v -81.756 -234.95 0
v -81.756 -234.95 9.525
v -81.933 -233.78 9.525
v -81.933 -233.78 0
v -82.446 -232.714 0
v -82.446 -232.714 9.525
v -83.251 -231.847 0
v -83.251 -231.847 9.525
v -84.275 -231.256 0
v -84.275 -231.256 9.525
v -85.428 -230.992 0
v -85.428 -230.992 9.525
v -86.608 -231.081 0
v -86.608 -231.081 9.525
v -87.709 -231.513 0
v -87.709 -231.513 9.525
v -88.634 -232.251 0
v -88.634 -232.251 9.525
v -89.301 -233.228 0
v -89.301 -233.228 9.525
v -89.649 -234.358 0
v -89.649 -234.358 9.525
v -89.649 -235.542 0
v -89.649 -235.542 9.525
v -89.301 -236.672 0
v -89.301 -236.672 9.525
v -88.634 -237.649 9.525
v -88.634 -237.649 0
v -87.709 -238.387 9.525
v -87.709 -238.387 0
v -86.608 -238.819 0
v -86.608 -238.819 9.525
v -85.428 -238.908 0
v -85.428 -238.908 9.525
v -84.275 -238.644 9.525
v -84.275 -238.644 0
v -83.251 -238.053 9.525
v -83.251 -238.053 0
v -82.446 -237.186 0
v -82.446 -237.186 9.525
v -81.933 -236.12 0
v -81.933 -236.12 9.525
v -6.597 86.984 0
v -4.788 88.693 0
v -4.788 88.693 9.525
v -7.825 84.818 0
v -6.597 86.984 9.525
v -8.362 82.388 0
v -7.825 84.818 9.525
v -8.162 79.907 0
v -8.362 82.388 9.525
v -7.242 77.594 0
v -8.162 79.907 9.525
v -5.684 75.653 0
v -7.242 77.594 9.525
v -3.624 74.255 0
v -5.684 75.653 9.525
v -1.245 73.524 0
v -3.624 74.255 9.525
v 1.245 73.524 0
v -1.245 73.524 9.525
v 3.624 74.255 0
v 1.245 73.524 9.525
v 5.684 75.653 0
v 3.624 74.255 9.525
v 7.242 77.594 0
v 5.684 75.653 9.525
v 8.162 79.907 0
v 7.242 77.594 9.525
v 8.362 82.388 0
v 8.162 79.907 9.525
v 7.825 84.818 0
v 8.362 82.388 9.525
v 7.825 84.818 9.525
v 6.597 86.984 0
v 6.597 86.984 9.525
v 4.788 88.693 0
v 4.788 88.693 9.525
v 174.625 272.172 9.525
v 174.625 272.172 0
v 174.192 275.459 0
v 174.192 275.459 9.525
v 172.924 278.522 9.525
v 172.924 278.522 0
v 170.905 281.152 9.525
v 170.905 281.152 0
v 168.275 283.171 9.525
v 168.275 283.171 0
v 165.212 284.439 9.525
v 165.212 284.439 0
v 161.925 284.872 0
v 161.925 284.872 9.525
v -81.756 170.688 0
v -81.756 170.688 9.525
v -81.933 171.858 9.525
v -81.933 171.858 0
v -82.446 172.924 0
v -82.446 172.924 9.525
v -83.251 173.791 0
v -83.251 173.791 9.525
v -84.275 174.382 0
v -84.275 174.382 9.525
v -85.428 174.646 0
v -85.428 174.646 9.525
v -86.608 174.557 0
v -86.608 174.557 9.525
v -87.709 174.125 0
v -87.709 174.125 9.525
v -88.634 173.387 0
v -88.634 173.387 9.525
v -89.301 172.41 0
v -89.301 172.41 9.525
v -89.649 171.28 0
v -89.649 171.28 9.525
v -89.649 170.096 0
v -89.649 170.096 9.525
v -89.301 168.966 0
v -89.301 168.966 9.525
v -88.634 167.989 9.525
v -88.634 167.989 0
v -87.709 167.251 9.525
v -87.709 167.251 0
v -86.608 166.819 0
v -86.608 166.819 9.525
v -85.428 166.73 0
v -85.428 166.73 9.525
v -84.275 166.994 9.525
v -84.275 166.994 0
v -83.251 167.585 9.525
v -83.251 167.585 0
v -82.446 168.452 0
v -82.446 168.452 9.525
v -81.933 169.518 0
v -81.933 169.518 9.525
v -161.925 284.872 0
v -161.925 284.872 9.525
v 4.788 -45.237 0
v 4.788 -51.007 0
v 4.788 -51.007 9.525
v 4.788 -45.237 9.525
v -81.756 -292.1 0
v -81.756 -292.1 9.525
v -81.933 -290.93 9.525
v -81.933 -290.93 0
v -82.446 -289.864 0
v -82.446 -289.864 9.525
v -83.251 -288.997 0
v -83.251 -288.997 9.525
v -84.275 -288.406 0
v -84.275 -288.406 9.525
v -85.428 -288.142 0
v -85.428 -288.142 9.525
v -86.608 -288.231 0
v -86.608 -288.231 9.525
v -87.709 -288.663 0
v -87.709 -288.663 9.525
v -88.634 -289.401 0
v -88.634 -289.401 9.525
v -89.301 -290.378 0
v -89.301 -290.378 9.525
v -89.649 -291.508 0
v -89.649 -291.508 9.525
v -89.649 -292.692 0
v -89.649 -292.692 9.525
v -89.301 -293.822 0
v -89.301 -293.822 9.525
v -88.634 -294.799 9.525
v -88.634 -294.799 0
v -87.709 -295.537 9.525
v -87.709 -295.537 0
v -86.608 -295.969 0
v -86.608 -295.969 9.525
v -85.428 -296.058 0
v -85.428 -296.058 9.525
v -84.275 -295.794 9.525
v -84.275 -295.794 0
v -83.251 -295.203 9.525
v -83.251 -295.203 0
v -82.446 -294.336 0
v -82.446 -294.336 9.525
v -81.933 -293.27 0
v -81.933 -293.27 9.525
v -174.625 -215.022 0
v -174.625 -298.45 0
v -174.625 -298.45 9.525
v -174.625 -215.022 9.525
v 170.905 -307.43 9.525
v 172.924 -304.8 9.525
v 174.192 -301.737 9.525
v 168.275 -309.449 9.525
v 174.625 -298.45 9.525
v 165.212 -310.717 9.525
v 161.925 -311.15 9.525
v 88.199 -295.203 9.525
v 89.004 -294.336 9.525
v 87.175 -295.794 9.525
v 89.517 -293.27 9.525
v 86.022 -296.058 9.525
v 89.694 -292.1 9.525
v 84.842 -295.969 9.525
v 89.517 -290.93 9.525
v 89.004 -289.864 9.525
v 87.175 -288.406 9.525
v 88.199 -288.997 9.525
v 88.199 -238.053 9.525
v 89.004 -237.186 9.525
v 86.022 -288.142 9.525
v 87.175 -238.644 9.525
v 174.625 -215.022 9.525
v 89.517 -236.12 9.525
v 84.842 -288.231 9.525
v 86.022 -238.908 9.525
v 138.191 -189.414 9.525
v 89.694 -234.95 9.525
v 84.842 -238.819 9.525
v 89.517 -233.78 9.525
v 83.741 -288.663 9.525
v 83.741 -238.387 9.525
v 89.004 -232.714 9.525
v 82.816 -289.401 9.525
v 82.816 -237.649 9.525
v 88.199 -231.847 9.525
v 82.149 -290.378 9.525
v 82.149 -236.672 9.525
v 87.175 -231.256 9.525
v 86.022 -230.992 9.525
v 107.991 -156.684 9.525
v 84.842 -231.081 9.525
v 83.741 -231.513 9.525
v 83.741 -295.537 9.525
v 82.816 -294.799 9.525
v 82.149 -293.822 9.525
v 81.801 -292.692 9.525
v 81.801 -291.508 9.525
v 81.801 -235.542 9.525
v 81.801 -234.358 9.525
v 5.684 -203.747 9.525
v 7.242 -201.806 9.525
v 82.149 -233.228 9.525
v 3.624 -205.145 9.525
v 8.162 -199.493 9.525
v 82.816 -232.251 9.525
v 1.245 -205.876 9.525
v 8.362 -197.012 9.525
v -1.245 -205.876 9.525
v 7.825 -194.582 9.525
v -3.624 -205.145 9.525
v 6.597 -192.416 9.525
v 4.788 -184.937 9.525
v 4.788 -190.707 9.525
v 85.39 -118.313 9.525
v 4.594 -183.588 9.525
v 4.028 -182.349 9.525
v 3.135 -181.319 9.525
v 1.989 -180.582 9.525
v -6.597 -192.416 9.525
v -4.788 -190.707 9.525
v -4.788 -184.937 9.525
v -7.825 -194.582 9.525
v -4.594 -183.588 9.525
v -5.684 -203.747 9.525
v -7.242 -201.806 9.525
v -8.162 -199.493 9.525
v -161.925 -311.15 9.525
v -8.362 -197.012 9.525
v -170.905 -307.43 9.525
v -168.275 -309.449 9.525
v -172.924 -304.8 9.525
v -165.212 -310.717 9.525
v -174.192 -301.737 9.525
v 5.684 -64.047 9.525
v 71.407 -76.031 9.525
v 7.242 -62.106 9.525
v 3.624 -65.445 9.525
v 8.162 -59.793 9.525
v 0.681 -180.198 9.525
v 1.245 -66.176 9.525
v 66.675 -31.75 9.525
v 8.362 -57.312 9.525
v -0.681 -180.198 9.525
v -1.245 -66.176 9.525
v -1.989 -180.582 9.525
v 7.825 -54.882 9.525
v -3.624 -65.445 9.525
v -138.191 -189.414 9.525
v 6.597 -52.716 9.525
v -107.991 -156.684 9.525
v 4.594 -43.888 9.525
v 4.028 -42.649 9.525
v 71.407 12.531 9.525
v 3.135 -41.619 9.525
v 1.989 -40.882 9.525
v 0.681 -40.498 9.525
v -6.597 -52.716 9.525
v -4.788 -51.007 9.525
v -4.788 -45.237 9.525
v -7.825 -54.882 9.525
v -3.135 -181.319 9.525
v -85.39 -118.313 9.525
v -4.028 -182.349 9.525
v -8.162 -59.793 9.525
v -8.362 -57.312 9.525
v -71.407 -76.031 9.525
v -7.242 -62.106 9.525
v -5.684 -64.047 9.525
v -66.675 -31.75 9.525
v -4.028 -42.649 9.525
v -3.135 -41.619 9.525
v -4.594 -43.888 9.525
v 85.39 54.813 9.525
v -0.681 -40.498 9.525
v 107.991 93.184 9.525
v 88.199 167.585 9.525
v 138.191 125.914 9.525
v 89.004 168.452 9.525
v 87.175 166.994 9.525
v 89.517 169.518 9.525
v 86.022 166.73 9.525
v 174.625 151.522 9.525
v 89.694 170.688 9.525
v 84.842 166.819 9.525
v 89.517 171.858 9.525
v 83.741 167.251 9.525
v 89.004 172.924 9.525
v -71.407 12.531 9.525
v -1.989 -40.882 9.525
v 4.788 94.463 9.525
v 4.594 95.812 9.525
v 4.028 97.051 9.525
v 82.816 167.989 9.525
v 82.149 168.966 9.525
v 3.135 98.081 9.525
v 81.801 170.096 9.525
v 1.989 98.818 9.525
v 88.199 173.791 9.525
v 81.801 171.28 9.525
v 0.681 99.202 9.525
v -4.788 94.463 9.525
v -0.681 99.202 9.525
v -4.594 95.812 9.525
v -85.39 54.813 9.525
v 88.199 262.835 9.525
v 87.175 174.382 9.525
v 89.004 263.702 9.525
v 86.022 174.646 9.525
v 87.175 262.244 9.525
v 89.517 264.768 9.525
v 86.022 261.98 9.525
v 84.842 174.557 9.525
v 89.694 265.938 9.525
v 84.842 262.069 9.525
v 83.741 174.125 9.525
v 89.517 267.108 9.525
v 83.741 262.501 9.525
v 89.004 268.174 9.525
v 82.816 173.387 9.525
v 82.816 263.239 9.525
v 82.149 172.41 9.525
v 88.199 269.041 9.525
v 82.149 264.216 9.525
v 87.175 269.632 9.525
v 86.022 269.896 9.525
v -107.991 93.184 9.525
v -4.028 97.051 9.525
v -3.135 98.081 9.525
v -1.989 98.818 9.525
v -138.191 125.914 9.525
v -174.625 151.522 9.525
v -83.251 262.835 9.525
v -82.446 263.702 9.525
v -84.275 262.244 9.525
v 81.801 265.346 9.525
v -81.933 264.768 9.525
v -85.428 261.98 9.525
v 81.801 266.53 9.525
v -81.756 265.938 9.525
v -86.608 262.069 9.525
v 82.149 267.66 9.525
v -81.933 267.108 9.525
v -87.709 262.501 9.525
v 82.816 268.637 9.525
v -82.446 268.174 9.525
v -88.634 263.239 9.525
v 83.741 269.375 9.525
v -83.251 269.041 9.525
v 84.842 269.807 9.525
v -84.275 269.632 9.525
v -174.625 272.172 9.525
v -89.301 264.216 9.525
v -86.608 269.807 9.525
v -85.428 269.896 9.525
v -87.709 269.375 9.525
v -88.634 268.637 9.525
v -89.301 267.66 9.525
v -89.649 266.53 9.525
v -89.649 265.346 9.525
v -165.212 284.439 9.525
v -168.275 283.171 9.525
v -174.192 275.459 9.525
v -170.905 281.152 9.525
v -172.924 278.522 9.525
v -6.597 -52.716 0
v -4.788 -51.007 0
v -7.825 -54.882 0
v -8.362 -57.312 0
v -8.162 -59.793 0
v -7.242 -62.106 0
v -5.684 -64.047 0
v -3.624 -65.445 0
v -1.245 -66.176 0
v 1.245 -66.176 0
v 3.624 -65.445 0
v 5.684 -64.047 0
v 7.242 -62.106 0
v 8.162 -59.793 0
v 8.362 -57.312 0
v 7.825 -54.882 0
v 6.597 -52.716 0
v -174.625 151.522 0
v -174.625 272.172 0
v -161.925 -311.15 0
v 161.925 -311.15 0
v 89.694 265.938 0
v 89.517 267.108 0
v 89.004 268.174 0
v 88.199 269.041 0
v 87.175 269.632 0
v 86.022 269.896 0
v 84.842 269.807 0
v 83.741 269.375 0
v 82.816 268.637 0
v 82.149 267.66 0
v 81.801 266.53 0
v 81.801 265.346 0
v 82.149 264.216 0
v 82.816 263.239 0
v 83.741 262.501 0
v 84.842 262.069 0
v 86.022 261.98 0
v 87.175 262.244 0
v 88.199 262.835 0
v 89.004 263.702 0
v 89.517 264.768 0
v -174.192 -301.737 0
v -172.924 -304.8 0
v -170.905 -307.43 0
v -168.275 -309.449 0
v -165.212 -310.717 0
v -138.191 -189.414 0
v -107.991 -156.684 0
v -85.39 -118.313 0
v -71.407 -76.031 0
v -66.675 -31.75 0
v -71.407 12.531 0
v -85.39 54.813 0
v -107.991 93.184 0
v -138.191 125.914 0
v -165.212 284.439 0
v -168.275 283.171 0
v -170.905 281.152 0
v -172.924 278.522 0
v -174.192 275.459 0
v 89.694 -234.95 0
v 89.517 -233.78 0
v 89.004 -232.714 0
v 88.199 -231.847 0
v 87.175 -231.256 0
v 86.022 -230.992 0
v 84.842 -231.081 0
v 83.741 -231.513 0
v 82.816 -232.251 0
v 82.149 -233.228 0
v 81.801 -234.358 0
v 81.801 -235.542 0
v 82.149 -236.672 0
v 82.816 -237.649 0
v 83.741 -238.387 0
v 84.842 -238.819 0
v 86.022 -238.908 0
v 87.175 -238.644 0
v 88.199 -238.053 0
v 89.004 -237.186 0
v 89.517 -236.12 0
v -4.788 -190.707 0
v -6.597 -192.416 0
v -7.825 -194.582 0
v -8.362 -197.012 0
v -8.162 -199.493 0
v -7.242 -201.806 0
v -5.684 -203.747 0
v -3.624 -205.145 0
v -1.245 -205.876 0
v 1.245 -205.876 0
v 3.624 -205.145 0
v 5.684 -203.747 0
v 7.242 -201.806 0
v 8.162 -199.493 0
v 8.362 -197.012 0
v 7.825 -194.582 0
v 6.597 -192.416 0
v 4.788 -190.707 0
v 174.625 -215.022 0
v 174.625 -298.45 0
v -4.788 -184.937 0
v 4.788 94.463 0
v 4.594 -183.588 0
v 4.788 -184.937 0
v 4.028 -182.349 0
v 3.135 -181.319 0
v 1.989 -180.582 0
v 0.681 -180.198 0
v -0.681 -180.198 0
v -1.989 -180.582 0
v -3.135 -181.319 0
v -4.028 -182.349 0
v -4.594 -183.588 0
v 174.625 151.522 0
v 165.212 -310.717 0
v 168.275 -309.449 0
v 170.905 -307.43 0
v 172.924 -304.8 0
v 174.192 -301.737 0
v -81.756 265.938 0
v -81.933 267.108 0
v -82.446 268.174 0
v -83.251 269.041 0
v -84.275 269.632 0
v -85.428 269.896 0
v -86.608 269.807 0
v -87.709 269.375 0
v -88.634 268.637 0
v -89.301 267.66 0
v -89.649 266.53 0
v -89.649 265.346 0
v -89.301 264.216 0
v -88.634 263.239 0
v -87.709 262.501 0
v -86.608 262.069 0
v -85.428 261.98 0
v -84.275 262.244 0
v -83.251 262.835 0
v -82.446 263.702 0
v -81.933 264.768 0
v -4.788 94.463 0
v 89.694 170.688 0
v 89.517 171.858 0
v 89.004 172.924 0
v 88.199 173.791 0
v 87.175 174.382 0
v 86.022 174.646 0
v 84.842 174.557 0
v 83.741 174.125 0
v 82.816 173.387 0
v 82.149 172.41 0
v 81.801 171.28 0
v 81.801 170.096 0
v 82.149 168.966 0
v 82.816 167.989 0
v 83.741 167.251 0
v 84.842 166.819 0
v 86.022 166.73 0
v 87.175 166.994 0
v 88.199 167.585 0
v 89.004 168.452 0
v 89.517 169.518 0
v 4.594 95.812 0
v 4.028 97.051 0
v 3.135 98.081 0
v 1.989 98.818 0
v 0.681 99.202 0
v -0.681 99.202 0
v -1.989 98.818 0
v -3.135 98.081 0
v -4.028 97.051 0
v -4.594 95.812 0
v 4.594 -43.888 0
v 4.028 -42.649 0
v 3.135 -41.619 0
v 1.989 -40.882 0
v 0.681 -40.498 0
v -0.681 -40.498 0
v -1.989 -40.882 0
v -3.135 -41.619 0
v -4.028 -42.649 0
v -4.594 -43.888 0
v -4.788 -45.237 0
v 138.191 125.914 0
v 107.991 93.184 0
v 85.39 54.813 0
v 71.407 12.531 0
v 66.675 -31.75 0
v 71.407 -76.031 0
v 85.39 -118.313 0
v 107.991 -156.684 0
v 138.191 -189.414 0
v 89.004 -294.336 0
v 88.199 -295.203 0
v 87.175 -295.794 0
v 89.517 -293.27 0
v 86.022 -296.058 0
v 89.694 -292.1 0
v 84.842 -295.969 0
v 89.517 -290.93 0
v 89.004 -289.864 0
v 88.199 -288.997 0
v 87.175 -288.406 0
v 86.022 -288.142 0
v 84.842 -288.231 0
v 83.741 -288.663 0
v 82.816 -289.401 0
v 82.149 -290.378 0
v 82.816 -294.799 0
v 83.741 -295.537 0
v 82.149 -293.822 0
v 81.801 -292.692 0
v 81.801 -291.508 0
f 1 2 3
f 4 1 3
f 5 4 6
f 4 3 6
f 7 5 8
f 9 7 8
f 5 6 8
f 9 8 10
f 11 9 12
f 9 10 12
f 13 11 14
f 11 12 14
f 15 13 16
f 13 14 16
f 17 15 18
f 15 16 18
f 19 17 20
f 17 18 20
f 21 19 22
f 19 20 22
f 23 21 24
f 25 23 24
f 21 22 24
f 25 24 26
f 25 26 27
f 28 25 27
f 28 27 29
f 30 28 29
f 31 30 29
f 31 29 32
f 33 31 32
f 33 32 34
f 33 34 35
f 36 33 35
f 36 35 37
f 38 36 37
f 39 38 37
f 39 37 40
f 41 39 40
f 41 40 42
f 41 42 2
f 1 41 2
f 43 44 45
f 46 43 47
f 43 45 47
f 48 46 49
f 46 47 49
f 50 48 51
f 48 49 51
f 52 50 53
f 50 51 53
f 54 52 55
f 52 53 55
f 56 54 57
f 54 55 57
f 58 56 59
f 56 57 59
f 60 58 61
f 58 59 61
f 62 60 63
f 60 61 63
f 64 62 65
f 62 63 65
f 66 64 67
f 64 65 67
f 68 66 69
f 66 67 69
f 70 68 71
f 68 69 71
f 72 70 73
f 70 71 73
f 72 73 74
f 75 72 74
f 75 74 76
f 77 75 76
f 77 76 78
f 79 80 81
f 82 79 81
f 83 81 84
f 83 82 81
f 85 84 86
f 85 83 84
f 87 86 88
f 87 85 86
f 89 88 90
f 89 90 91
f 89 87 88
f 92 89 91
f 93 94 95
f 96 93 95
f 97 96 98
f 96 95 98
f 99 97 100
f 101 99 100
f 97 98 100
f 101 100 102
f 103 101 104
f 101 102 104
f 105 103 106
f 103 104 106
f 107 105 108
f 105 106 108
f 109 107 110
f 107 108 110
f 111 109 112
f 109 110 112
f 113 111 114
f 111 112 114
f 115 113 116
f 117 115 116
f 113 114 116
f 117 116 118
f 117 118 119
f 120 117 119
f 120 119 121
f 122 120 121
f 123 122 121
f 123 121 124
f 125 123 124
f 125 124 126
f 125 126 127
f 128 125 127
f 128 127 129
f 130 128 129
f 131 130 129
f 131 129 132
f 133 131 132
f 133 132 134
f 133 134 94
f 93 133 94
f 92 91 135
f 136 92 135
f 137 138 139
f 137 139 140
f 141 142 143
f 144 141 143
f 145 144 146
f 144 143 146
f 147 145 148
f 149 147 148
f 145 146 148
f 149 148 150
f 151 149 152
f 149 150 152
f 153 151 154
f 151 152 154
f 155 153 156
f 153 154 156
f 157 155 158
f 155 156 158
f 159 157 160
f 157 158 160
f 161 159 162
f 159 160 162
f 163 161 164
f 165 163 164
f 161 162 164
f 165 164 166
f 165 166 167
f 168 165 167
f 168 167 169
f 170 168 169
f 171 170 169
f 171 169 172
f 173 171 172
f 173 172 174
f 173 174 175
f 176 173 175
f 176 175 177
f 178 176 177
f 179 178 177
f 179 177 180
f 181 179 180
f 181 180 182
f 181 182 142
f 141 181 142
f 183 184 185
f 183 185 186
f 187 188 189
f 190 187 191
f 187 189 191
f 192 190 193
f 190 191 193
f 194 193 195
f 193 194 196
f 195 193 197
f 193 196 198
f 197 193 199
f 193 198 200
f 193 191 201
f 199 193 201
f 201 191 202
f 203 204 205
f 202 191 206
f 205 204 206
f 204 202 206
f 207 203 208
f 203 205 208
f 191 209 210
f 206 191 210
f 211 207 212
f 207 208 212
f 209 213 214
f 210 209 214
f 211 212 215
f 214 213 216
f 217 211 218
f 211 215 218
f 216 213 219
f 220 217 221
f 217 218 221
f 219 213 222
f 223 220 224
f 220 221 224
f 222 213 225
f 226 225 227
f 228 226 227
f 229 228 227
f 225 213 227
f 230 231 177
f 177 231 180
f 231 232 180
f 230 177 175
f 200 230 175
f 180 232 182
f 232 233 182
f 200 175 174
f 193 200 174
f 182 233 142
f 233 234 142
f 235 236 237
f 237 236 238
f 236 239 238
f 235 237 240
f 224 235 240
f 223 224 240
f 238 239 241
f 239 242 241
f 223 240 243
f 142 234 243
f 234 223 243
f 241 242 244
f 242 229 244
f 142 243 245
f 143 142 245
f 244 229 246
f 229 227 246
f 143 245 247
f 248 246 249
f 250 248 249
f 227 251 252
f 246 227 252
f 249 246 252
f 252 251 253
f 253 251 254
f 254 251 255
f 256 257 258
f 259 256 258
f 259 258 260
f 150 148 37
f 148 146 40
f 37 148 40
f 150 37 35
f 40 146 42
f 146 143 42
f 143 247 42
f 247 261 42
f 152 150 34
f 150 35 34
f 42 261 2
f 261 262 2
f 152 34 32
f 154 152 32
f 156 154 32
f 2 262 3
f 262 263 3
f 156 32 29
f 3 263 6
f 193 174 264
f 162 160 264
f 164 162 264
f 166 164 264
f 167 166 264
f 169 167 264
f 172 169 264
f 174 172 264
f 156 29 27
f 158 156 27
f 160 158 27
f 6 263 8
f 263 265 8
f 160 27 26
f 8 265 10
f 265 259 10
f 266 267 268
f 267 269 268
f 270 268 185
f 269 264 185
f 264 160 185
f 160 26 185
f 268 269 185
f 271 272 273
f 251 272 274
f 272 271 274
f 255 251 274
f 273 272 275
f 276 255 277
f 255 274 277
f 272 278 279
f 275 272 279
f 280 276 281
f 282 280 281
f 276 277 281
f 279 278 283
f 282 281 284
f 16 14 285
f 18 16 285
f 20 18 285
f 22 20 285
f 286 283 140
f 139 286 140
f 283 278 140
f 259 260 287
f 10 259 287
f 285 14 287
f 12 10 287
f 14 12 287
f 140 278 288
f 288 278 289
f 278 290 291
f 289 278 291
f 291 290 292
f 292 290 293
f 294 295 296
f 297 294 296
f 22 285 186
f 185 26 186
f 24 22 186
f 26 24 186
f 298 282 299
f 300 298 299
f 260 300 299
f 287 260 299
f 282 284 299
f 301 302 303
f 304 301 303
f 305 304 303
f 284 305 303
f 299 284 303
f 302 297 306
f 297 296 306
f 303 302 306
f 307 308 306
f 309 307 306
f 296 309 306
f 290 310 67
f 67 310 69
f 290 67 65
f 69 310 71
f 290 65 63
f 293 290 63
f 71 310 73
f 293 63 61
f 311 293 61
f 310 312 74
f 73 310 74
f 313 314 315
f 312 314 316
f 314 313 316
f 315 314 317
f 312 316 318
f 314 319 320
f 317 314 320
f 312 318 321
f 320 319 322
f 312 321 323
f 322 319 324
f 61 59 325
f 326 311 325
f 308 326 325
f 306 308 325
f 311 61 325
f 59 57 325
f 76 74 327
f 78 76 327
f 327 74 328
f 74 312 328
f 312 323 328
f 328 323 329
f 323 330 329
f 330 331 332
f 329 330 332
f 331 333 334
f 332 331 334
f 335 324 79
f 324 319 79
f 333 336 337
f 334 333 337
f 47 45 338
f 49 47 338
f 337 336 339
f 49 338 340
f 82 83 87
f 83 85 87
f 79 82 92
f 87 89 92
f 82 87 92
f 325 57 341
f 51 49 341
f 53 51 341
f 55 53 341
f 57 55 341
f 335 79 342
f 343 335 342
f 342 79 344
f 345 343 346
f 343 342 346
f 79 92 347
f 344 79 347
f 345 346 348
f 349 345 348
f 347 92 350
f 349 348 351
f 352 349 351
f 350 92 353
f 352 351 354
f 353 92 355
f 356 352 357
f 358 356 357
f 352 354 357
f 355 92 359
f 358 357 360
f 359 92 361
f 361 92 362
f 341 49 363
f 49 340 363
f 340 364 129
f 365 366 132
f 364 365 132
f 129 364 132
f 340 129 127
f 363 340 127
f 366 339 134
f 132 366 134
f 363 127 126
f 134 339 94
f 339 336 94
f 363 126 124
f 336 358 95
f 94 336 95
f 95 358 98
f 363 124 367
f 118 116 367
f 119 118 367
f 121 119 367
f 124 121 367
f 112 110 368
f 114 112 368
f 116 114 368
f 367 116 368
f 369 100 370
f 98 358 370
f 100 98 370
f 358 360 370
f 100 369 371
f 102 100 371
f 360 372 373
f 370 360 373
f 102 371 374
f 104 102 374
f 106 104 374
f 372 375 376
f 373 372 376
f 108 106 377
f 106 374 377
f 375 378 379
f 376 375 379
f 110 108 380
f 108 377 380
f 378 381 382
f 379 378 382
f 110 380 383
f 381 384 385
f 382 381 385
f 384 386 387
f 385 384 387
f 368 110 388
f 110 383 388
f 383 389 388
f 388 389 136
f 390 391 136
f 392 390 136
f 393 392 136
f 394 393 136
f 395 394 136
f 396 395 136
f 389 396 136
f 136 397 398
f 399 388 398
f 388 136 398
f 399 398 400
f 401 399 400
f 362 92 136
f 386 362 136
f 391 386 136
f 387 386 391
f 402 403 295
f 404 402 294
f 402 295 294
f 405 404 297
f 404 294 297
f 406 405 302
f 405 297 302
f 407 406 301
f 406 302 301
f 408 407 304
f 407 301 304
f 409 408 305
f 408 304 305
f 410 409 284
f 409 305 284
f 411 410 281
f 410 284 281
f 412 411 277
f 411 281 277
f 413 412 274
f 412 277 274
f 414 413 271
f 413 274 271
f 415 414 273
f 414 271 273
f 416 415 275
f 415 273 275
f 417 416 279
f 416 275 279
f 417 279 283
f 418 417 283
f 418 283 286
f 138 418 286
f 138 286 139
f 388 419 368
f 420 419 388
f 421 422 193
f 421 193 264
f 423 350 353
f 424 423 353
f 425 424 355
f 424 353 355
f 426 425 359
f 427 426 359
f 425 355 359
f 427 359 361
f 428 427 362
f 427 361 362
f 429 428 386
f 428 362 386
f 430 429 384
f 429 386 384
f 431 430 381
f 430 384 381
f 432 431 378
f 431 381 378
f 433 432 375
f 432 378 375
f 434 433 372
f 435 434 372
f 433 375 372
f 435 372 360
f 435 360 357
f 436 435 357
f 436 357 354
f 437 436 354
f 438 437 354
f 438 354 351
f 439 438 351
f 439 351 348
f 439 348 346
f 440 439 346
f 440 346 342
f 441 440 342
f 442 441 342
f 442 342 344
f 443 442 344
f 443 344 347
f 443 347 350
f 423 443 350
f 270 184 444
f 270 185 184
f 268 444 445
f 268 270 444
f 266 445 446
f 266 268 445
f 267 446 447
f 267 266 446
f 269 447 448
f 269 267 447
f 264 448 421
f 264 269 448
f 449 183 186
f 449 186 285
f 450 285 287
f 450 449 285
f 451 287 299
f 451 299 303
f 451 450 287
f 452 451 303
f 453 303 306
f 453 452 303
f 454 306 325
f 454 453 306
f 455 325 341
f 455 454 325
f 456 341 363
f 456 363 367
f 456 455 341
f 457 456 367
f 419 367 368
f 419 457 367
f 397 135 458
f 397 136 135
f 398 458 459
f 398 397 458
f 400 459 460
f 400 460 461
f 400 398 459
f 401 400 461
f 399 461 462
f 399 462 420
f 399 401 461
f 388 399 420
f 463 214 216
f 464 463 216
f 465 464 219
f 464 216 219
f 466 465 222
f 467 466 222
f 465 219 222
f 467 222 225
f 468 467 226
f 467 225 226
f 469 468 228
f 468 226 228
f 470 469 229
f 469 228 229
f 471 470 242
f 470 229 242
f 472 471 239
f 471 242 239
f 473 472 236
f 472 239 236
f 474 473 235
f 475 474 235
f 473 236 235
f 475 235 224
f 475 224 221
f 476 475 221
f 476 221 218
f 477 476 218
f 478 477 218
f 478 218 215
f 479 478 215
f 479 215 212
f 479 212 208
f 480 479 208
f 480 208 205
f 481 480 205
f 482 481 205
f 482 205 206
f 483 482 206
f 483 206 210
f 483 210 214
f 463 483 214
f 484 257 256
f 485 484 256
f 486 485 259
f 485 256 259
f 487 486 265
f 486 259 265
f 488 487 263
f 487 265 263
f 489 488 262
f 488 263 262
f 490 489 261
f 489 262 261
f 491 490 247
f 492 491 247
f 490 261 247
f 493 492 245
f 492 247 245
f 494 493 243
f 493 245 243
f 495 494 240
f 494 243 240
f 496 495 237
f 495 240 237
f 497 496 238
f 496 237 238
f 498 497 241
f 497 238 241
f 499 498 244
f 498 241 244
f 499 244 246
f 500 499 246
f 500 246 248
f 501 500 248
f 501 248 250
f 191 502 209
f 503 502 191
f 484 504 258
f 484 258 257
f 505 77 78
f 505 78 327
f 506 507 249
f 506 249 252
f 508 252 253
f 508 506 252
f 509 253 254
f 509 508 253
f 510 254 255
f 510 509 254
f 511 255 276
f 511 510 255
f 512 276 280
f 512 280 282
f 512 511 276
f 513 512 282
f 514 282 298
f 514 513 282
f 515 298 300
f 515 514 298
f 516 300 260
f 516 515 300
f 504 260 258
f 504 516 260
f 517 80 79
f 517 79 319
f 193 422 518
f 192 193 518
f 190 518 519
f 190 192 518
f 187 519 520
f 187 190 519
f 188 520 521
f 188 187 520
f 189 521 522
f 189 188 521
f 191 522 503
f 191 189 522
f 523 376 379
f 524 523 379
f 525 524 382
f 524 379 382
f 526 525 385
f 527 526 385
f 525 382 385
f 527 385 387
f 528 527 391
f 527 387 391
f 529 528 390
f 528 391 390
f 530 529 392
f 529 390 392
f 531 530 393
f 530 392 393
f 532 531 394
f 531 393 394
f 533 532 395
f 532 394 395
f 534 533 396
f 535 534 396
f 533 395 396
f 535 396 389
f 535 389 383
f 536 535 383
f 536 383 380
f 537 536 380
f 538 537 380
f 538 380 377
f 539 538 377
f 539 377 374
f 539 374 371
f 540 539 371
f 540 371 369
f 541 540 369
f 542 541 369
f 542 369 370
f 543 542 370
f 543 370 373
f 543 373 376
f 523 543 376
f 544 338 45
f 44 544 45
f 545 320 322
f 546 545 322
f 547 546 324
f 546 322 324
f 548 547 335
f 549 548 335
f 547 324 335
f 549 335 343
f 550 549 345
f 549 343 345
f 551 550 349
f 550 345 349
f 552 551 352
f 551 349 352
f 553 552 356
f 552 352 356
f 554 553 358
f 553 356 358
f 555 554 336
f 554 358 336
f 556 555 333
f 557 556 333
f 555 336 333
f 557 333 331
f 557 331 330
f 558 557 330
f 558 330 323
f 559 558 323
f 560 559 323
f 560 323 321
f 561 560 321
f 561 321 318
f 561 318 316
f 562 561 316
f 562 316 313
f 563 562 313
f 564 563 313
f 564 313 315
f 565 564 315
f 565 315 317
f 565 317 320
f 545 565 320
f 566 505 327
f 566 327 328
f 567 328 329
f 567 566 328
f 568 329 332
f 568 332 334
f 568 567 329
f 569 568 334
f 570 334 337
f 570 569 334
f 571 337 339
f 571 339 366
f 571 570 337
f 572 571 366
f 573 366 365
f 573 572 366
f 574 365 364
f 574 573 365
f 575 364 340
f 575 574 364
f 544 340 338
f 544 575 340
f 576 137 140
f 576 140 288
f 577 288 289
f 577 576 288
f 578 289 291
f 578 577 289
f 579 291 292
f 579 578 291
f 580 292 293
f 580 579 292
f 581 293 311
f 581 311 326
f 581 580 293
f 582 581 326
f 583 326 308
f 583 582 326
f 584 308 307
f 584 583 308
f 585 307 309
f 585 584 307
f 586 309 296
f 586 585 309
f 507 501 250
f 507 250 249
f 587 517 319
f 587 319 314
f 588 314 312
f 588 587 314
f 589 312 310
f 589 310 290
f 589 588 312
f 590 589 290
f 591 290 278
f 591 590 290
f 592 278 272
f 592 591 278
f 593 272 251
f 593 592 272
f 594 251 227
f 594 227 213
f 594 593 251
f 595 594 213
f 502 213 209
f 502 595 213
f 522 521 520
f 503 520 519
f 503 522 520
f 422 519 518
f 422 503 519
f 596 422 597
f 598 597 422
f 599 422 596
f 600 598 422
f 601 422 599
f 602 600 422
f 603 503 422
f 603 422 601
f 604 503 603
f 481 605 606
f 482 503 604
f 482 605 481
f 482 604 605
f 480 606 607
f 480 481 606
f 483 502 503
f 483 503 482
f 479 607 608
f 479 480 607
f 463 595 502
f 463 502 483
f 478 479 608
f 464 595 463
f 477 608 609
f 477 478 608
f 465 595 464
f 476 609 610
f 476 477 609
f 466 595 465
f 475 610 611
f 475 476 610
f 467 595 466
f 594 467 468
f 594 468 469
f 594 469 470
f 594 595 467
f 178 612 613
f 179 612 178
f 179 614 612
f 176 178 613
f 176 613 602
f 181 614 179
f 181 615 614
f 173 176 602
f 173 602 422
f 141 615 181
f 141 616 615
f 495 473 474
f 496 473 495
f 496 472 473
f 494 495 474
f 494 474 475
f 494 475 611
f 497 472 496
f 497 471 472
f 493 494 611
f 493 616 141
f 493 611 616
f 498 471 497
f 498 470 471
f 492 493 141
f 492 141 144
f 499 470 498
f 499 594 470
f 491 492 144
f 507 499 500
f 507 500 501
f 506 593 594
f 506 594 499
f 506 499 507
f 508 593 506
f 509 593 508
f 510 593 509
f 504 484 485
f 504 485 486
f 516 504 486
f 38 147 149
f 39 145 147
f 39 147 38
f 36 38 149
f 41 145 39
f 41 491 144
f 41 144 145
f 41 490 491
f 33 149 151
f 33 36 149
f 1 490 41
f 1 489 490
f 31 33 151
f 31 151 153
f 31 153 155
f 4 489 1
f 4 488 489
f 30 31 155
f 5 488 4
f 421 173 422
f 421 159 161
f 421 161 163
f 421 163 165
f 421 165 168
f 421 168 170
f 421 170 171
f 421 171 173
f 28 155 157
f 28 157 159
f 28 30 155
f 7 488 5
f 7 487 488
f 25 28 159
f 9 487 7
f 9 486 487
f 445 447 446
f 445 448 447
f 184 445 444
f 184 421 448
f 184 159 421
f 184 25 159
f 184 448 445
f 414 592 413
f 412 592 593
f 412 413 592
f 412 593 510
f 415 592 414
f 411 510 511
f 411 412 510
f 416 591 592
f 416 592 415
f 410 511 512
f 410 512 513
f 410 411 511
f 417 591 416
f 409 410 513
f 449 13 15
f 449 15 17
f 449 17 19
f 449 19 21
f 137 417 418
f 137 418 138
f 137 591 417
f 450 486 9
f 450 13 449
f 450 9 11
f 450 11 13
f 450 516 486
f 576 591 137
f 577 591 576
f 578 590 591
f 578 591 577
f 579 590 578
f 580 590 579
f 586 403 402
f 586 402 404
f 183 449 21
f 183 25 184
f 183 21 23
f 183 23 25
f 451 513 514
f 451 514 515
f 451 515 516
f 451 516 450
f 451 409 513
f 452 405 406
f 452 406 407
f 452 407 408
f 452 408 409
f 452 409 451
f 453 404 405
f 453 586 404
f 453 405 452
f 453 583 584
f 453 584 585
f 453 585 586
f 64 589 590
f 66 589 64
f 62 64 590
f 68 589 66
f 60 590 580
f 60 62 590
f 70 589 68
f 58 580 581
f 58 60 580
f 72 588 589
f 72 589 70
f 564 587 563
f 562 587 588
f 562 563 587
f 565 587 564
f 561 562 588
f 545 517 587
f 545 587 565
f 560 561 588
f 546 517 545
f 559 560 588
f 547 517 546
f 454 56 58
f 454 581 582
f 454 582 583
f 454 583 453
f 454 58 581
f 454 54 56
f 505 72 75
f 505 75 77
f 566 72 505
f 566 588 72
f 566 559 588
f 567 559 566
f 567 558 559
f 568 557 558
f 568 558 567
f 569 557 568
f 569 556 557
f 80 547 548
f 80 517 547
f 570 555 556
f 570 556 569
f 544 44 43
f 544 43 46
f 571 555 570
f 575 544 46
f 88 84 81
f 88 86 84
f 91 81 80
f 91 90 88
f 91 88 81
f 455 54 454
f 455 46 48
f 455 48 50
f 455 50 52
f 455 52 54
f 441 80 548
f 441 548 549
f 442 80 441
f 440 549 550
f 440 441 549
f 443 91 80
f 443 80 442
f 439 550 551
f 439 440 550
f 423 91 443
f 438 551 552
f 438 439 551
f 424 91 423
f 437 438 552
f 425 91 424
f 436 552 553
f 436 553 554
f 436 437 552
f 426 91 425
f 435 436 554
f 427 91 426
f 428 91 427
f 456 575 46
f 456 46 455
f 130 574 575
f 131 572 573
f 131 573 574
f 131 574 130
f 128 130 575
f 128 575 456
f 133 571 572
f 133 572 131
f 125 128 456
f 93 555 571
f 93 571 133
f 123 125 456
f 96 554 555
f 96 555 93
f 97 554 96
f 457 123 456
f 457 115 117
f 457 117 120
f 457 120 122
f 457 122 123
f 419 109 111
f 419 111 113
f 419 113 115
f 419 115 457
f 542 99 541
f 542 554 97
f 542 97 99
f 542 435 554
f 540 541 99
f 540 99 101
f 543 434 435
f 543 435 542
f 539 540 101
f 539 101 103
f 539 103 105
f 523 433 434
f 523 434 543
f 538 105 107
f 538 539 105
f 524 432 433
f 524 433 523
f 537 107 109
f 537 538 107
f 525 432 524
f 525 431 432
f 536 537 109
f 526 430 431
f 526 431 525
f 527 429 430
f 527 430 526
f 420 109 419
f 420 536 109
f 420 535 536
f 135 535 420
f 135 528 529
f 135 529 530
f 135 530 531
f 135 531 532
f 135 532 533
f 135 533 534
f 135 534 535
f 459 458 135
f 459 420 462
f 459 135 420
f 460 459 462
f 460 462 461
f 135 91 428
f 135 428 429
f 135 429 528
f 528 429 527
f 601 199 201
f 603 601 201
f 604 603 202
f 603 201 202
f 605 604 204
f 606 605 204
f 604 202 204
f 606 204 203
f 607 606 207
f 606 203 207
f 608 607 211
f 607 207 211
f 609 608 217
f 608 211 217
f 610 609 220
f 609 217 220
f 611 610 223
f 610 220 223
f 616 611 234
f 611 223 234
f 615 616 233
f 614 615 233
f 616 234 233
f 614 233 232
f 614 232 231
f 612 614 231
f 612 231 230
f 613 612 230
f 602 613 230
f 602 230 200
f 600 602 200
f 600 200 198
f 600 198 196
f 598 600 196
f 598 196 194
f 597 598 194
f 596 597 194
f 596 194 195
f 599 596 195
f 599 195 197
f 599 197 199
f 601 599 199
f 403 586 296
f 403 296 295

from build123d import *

# Parameters (mm, degrees)
BOSS_EXTRUDE1_DEPTH            = 9.525
V_0_377_DIAMETER_SLOT1_DEPTH   = 9.525
FILLET1_R                      = 12.7
SKETCH6_R                      = 8.382
CUT_EXTRUDE1_DEPTH             = 357.929879318
F_5_16_0_3125_DIAMETER_HOLE1_D = 7.9375
SKETCH14_W                     = 349.25
SKETCH14_H                     = 26.277954941
CUT_EXTRUDE3_DEPTH             = 357.929879318
FILLET2_R                      = 12.7


# Read off the part's stored shape, not the designer's step: V (0.377) Diameter Slot1
with BuildPart() as part:
    # Sketch1 → Boss-Extrude1 (new body)
    with BuildSketch(Plane.XY):
        with BuildLine():
            Line((-174.625, 151.522045059), (-174.625, 311.15))
            Line((-174.625, 311.15), (174.625, 311.15))
            Line((174.625, 311.15), (174.625, 151.522045059))
            ThreePointArc((174.625, 151.522045059), (66.675, -31.75), (174.625, -215.022045059))
            Line((174.625, -215.022045059), (174.625, -311.15))
            Line((174.625, -311.15), (-174.625, -311.15))
            Line((-174.625, -311.15), (-174.625, -215.022045059))
            ThreePointArc((-174.625, -215.022045059), (-66.675, -31.75), (-174.625, 151.522045059))
        make_face()
    extrude(amount=BOSS_EXTRUDE1_DEPTH)

    # V (0.377) Diameter Slot1 outline → V (0.377) Diameter Slot1 (cut)
    with BuildSketch(Plane.XY):
        with BuildLine():
            Line((4.7879, -57.8866), (4.7879, -45.2374))
            ThreePointArc((4.7879, -45.2374), (0, -40.4495), (-4.7879, -45.2374))
            Line((-4.7879, -45.2374), (-4.7879, -57.8866))
            ThreePointArc((-4.7879, -57.8866), (0, -62.6745), (4.7879, -57.8866))
        make_face()
        with BuildLine():
            ThreePointArc((4.7879, 94.4626), (0, 99.2505), (-4.7879, 94.4626))
            Line((-4.7879, 94.4626), (-4.7879, 81.8134))
            ThreePointArc((-4.7879, 81.8134), (0, 77.0255), (4.7879, 81.8134))
            Line((4.7879, 81.8134), (4.7879, 94.4626))
        make_face()
        with BuildLine():
            ThreePointArc((4.7879, -184.9374), (0, -180.1495), (-4.7879, -184.9374))
            Line((-4.7879, -184.9374), (-4.7879, -197.5866))
            ThreePointArc((-4.7879, -197.5866), (0, -202.3745), (4.7879, -197.5866))
            Line((4.7879, -197.5866), (4.7879, -184.9374))
        make_face()
    extrude(amount=V_0_377_DIAMETER_SLOT1_DEPTH, mode=Mode.SUBTRACT)

    # Fillet1
    fillet1_edges = [part.edges().sort_by_distance(p)[0] for p in [
        (174.625, -311.15, 4.7625),
        (-174.625, -311.15, 4.7625),
    ]]
    fillet(fillet1_edges, radius=FILLET1_R)

    # Sketch6 → Cut-Extrude1 (cut, through all)
    with BuildSketch(Plane.XY.offset(9.525)):
        with Locations((0, -197.5866)):
            Circle(SKETCH6_R)
        with Locations((0, 81.8134)):
            Circle(SKETCH6_R)
        with Locations((0, -57.8866)):
            Circle(SKETCH6_R)
    extrude(amount=-CUT_EXTRUDE1_DEPTH, mode=Mode.SUBTRACT)

    # 5/16 (0.3125) Diameter Hole1 (through all)
    with Locations(Plane(origin=(0, 0, 0), x_dir=(-1, 0, 0), z_dir=(0, 0, -1))):
        with Locations((-85.725, 265.938), (85.725, 170.688), (85.725, 265.938), (-85.725, 170.688), (85.725, -234.95), (85.725, -292.1), (-85.725, -292.1), (-85.725, -234.95)):
            Hole(F_5_16_0_3125_DIAMETER_HOLE1_D / 2)

    # Sketch14 → Cut-Extrude3 (cut, through all)
    with BuildSketch(Plane(origin=(0, 0, 0), x_dir=(-1, 0, 0), z_dir=(0, 0, -1))):
        with Locations((0, 298.011022529)):
            Rectangle(SKETCH14_W, SKETCH14_H)
    extrude(amount=-CUT_EXTRUDE3_DEPTH, mode=Mode.SUBTRACT)

    # Fillet2
    fillet2_edges = [part.edges().sort_by_distance(p)[0] for p in [
        (174.625, 284.872045059, 4.7625),
        (-174.625, 284.872045059, 4.7625),
    ]]
    fillet(fillet2_edges, radius=FILLET2_R)


solid = part.part
